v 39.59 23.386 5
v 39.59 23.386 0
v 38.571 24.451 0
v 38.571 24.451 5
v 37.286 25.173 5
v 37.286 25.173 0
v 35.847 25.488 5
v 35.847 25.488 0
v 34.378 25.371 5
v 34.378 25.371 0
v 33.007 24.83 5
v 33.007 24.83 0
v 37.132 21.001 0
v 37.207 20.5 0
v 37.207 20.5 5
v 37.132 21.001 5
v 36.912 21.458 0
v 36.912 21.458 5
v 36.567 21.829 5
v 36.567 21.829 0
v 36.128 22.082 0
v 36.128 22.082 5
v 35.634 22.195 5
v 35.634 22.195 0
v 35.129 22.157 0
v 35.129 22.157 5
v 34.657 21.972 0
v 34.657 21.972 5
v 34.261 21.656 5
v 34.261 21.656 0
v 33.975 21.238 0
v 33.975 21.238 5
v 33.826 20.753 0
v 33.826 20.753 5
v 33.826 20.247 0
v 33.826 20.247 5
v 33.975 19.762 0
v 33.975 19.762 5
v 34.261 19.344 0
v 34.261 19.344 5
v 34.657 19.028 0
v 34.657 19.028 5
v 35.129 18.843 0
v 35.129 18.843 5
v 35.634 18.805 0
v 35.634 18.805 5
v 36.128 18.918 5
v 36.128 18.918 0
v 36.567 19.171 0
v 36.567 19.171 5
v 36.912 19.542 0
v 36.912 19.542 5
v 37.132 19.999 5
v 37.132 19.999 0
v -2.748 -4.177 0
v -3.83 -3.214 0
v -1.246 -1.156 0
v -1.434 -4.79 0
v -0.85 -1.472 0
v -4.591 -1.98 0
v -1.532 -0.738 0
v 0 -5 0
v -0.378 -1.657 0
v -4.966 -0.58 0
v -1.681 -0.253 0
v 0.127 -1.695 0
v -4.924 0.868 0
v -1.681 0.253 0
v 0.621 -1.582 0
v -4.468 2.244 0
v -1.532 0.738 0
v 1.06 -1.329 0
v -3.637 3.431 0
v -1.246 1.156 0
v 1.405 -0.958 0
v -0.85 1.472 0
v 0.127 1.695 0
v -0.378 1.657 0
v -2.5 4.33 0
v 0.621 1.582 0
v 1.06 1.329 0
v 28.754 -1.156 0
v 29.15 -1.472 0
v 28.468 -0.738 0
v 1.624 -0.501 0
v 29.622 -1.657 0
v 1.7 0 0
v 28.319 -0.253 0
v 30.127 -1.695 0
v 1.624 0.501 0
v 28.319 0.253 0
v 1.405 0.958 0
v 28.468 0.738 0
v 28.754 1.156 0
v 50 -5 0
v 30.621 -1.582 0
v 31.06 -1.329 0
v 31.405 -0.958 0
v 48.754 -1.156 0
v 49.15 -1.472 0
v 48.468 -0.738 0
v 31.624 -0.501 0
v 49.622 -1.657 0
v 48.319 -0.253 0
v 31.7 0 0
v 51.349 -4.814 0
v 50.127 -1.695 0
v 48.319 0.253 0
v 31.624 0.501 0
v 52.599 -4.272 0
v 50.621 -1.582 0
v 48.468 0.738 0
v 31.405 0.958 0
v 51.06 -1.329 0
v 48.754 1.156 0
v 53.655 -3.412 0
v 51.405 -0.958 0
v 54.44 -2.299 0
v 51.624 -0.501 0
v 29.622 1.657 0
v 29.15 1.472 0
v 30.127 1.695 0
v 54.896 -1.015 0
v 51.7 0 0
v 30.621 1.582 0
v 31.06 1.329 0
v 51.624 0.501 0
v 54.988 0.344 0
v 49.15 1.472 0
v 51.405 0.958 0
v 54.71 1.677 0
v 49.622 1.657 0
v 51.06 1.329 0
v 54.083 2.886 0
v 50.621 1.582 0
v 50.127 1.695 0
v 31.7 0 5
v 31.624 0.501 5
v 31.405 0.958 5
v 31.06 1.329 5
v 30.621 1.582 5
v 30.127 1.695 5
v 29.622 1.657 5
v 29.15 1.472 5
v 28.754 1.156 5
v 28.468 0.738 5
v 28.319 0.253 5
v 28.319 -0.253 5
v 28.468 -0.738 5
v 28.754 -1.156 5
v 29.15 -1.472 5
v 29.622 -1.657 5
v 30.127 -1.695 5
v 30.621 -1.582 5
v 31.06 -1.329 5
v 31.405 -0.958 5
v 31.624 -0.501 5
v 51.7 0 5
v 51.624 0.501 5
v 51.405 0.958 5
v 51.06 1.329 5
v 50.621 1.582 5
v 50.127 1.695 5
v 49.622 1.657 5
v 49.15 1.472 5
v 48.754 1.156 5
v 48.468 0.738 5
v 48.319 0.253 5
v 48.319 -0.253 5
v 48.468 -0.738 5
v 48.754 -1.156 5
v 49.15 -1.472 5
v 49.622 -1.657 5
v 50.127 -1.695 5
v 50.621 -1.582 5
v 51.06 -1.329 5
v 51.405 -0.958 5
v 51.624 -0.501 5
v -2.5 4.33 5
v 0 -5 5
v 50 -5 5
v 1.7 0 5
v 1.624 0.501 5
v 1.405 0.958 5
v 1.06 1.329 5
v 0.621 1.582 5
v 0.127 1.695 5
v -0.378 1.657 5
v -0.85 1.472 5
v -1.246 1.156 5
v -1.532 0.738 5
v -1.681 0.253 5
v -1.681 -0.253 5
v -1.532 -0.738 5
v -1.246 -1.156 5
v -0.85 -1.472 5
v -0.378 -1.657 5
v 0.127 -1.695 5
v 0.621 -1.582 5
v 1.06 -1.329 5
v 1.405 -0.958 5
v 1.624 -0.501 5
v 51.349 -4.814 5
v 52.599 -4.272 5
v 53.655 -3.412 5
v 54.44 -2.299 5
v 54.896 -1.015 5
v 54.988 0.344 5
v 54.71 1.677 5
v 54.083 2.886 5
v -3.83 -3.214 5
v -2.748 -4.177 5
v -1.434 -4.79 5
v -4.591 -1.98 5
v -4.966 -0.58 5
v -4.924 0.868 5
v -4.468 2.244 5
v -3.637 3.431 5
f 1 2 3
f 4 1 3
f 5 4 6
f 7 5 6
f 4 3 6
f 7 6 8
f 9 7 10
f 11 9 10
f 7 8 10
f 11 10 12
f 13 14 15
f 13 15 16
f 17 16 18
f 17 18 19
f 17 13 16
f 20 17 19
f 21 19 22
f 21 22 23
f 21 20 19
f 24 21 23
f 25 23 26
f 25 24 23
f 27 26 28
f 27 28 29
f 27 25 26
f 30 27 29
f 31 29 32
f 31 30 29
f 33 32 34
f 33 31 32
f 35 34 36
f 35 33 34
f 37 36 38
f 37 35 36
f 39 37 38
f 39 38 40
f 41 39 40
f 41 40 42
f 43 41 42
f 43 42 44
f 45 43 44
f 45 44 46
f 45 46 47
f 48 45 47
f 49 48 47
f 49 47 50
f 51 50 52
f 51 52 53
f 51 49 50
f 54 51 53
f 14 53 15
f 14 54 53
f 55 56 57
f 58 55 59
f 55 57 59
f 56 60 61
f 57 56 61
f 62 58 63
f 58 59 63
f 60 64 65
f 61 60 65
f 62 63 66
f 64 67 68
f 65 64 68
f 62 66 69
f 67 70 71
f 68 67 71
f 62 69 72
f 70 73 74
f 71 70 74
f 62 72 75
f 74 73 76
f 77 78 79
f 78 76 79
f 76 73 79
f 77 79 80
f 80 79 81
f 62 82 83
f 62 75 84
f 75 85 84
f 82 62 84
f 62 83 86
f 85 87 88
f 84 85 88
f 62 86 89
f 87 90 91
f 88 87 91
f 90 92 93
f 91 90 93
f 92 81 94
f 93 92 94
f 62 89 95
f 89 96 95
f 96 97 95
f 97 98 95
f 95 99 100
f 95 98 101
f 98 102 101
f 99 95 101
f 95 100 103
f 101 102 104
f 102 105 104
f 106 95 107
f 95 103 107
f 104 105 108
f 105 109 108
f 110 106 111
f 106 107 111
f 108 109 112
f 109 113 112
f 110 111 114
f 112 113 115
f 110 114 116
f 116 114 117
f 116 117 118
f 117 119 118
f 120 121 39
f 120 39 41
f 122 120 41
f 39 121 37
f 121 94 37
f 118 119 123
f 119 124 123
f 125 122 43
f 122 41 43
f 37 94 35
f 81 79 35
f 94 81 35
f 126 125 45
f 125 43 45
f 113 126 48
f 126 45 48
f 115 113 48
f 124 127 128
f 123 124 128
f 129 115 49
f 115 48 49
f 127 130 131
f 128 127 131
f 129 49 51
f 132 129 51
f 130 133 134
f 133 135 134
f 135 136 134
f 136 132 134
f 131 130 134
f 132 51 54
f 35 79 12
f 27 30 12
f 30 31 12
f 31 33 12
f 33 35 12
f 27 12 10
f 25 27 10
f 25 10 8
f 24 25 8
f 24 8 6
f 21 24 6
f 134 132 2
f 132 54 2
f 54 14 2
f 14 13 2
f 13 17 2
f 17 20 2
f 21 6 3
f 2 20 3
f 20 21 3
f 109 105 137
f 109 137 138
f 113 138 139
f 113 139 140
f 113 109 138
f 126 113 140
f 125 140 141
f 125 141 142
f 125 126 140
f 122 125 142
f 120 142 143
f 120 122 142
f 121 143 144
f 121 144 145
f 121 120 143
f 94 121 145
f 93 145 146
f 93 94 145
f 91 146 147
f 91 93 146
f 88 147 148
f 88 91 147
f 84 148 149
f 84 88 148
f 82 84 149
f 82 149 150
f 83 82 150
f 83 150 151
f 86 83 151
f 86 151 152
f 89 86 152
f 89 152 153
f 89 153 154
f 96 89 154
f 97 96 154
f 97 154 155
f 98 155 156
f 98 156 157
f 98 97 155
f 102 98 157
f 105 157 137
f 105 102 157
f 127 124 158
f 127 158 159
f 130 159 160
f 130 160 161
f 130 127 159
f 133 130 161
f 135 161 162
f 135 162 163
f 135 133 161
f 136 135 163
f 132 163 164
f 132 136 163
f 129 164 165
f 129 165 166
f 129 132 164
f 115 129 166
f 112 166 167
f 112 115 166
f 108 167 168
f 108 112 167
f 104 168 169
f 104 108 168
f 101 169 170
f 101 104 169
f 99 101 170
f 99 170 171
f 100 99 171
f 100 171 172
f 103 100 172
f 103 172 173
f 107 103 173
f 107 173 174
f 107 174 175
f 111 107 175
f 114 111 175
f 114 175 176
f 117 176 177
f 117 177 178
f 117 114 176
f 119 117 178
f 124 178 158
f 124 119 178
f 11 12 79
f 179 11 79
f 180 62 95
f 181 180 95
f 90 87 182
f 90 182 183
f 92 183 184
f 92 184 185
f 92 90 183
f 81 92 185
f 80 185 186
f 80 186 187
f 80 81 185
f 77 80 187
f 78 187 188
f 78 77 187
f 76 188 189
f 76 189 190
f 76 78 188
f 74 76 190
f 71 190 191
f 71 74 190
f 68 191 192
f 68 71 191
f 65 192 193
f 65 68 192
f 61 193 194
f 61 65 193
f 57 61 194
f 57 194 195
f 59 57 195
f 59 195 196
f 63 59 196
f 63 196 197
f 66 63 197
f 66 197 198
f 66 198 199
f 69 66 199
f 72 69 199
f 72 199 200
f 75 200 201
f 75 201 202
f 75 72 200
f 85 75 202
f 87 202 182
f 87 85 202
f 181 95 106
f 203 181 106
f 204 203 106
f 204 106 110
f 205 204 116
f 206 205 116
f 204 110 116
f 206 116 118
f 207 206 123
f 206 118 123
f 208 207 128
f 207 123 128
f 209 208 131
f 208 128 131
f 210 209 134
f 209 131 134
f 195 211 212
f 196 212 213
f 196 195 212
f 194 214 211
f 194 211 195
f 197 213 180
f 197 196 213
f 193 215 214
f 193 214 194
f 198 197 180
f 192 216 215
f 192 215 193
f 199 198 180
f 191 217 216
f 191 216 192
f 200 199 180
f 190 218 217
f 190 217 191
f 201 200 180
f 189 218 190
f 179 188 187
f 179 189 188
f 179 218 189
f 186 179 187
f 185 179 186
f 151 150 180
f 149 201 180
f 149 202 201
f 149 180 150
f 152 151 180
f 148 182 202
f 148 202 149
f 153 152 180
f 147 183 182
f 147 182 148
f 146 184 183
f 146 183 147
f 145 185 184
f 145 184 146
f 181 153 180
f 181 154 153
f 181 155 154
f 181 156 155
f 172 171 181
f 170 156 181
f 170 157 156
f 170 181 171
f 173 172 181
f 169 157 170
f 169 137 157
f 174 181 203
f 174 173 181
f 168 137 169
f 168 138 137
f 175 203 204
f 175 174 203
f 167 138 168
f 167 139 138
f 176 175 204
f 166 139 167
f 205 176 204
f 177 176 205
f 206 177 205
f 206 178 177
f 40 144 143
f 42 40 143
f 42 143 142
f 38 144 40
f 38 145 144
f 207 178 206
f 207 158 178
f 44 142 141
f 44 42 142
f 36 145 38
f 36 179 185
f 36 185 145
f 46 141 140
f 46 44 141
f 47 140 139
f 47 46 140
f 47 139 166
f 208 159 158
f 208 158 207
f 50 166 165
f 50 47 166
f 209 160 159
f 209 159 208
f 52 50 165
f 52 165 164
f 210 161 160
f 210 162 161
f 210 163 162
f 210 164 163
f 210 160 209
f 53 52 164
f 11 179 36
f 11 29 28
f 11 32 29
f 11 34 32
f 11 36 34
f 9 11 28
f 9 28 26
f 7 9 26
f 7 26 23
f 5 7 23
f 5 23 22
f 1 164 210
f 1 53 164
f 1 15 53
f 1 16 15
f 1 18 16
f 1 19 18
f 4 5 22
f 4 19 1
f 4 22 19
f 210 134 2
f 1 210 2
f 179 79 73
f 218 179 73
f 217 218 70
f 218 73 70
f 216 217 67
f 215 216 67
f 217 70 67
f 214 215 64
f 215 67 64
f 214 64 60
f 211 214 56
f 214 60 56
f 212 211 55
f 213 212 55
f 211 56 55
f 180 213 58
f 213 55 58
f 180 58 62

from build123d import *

# Parameters (mm, degrees)
SKETCH_1_R      = 1.7
EXTRUDE_1_DEPTH = 5


with BuildPart() as part:
    # ｽｹｯﾁ1 → ﾎﾞｽ - 押し出し1 (new body)
    with BuildSketch(Plane.XY):
        with BuildLine():
            Line((54.082739258, 2.886388773), (39.5897808, 23.386388791))
            ThreePointArc((39.5897808, 23.386388791), (36.578191054, 25.383916333), (33.007041847, 24.830127187))
            Line((33.007041847, 24.830127187), (-2.50000007, 4.330126978))
            ThreePointArc((-2.50000007, 4.330126978), (-4.829629126, -1.294095246), (-3.8e-08, -5))
            Line((-3.8e-08, -5), (50, -5))
            ThreePointArc((50, -5), (54.440267102, -2.298701387), (54.082739258, 2.886388773))
        make_face()
        Circle(SKETCH_1_R, mode=Mode.SUBTRACT)
        with Locations((30, 0)):
            Circle(SKETCH_1_R, mode=Mode.SUBTRACT)
        with Locations((35.507041555, 20.5)):
            Circle(SKETCH_1_R, mode=Mode.SUBTRACT)
        with Locations((50, 0)):
            Circle(SKETCH_1_R, mode=Mode.SUBTRACT)
    extrude(amount=EXTRUDE_1_DEPTH)


solid = part.part
